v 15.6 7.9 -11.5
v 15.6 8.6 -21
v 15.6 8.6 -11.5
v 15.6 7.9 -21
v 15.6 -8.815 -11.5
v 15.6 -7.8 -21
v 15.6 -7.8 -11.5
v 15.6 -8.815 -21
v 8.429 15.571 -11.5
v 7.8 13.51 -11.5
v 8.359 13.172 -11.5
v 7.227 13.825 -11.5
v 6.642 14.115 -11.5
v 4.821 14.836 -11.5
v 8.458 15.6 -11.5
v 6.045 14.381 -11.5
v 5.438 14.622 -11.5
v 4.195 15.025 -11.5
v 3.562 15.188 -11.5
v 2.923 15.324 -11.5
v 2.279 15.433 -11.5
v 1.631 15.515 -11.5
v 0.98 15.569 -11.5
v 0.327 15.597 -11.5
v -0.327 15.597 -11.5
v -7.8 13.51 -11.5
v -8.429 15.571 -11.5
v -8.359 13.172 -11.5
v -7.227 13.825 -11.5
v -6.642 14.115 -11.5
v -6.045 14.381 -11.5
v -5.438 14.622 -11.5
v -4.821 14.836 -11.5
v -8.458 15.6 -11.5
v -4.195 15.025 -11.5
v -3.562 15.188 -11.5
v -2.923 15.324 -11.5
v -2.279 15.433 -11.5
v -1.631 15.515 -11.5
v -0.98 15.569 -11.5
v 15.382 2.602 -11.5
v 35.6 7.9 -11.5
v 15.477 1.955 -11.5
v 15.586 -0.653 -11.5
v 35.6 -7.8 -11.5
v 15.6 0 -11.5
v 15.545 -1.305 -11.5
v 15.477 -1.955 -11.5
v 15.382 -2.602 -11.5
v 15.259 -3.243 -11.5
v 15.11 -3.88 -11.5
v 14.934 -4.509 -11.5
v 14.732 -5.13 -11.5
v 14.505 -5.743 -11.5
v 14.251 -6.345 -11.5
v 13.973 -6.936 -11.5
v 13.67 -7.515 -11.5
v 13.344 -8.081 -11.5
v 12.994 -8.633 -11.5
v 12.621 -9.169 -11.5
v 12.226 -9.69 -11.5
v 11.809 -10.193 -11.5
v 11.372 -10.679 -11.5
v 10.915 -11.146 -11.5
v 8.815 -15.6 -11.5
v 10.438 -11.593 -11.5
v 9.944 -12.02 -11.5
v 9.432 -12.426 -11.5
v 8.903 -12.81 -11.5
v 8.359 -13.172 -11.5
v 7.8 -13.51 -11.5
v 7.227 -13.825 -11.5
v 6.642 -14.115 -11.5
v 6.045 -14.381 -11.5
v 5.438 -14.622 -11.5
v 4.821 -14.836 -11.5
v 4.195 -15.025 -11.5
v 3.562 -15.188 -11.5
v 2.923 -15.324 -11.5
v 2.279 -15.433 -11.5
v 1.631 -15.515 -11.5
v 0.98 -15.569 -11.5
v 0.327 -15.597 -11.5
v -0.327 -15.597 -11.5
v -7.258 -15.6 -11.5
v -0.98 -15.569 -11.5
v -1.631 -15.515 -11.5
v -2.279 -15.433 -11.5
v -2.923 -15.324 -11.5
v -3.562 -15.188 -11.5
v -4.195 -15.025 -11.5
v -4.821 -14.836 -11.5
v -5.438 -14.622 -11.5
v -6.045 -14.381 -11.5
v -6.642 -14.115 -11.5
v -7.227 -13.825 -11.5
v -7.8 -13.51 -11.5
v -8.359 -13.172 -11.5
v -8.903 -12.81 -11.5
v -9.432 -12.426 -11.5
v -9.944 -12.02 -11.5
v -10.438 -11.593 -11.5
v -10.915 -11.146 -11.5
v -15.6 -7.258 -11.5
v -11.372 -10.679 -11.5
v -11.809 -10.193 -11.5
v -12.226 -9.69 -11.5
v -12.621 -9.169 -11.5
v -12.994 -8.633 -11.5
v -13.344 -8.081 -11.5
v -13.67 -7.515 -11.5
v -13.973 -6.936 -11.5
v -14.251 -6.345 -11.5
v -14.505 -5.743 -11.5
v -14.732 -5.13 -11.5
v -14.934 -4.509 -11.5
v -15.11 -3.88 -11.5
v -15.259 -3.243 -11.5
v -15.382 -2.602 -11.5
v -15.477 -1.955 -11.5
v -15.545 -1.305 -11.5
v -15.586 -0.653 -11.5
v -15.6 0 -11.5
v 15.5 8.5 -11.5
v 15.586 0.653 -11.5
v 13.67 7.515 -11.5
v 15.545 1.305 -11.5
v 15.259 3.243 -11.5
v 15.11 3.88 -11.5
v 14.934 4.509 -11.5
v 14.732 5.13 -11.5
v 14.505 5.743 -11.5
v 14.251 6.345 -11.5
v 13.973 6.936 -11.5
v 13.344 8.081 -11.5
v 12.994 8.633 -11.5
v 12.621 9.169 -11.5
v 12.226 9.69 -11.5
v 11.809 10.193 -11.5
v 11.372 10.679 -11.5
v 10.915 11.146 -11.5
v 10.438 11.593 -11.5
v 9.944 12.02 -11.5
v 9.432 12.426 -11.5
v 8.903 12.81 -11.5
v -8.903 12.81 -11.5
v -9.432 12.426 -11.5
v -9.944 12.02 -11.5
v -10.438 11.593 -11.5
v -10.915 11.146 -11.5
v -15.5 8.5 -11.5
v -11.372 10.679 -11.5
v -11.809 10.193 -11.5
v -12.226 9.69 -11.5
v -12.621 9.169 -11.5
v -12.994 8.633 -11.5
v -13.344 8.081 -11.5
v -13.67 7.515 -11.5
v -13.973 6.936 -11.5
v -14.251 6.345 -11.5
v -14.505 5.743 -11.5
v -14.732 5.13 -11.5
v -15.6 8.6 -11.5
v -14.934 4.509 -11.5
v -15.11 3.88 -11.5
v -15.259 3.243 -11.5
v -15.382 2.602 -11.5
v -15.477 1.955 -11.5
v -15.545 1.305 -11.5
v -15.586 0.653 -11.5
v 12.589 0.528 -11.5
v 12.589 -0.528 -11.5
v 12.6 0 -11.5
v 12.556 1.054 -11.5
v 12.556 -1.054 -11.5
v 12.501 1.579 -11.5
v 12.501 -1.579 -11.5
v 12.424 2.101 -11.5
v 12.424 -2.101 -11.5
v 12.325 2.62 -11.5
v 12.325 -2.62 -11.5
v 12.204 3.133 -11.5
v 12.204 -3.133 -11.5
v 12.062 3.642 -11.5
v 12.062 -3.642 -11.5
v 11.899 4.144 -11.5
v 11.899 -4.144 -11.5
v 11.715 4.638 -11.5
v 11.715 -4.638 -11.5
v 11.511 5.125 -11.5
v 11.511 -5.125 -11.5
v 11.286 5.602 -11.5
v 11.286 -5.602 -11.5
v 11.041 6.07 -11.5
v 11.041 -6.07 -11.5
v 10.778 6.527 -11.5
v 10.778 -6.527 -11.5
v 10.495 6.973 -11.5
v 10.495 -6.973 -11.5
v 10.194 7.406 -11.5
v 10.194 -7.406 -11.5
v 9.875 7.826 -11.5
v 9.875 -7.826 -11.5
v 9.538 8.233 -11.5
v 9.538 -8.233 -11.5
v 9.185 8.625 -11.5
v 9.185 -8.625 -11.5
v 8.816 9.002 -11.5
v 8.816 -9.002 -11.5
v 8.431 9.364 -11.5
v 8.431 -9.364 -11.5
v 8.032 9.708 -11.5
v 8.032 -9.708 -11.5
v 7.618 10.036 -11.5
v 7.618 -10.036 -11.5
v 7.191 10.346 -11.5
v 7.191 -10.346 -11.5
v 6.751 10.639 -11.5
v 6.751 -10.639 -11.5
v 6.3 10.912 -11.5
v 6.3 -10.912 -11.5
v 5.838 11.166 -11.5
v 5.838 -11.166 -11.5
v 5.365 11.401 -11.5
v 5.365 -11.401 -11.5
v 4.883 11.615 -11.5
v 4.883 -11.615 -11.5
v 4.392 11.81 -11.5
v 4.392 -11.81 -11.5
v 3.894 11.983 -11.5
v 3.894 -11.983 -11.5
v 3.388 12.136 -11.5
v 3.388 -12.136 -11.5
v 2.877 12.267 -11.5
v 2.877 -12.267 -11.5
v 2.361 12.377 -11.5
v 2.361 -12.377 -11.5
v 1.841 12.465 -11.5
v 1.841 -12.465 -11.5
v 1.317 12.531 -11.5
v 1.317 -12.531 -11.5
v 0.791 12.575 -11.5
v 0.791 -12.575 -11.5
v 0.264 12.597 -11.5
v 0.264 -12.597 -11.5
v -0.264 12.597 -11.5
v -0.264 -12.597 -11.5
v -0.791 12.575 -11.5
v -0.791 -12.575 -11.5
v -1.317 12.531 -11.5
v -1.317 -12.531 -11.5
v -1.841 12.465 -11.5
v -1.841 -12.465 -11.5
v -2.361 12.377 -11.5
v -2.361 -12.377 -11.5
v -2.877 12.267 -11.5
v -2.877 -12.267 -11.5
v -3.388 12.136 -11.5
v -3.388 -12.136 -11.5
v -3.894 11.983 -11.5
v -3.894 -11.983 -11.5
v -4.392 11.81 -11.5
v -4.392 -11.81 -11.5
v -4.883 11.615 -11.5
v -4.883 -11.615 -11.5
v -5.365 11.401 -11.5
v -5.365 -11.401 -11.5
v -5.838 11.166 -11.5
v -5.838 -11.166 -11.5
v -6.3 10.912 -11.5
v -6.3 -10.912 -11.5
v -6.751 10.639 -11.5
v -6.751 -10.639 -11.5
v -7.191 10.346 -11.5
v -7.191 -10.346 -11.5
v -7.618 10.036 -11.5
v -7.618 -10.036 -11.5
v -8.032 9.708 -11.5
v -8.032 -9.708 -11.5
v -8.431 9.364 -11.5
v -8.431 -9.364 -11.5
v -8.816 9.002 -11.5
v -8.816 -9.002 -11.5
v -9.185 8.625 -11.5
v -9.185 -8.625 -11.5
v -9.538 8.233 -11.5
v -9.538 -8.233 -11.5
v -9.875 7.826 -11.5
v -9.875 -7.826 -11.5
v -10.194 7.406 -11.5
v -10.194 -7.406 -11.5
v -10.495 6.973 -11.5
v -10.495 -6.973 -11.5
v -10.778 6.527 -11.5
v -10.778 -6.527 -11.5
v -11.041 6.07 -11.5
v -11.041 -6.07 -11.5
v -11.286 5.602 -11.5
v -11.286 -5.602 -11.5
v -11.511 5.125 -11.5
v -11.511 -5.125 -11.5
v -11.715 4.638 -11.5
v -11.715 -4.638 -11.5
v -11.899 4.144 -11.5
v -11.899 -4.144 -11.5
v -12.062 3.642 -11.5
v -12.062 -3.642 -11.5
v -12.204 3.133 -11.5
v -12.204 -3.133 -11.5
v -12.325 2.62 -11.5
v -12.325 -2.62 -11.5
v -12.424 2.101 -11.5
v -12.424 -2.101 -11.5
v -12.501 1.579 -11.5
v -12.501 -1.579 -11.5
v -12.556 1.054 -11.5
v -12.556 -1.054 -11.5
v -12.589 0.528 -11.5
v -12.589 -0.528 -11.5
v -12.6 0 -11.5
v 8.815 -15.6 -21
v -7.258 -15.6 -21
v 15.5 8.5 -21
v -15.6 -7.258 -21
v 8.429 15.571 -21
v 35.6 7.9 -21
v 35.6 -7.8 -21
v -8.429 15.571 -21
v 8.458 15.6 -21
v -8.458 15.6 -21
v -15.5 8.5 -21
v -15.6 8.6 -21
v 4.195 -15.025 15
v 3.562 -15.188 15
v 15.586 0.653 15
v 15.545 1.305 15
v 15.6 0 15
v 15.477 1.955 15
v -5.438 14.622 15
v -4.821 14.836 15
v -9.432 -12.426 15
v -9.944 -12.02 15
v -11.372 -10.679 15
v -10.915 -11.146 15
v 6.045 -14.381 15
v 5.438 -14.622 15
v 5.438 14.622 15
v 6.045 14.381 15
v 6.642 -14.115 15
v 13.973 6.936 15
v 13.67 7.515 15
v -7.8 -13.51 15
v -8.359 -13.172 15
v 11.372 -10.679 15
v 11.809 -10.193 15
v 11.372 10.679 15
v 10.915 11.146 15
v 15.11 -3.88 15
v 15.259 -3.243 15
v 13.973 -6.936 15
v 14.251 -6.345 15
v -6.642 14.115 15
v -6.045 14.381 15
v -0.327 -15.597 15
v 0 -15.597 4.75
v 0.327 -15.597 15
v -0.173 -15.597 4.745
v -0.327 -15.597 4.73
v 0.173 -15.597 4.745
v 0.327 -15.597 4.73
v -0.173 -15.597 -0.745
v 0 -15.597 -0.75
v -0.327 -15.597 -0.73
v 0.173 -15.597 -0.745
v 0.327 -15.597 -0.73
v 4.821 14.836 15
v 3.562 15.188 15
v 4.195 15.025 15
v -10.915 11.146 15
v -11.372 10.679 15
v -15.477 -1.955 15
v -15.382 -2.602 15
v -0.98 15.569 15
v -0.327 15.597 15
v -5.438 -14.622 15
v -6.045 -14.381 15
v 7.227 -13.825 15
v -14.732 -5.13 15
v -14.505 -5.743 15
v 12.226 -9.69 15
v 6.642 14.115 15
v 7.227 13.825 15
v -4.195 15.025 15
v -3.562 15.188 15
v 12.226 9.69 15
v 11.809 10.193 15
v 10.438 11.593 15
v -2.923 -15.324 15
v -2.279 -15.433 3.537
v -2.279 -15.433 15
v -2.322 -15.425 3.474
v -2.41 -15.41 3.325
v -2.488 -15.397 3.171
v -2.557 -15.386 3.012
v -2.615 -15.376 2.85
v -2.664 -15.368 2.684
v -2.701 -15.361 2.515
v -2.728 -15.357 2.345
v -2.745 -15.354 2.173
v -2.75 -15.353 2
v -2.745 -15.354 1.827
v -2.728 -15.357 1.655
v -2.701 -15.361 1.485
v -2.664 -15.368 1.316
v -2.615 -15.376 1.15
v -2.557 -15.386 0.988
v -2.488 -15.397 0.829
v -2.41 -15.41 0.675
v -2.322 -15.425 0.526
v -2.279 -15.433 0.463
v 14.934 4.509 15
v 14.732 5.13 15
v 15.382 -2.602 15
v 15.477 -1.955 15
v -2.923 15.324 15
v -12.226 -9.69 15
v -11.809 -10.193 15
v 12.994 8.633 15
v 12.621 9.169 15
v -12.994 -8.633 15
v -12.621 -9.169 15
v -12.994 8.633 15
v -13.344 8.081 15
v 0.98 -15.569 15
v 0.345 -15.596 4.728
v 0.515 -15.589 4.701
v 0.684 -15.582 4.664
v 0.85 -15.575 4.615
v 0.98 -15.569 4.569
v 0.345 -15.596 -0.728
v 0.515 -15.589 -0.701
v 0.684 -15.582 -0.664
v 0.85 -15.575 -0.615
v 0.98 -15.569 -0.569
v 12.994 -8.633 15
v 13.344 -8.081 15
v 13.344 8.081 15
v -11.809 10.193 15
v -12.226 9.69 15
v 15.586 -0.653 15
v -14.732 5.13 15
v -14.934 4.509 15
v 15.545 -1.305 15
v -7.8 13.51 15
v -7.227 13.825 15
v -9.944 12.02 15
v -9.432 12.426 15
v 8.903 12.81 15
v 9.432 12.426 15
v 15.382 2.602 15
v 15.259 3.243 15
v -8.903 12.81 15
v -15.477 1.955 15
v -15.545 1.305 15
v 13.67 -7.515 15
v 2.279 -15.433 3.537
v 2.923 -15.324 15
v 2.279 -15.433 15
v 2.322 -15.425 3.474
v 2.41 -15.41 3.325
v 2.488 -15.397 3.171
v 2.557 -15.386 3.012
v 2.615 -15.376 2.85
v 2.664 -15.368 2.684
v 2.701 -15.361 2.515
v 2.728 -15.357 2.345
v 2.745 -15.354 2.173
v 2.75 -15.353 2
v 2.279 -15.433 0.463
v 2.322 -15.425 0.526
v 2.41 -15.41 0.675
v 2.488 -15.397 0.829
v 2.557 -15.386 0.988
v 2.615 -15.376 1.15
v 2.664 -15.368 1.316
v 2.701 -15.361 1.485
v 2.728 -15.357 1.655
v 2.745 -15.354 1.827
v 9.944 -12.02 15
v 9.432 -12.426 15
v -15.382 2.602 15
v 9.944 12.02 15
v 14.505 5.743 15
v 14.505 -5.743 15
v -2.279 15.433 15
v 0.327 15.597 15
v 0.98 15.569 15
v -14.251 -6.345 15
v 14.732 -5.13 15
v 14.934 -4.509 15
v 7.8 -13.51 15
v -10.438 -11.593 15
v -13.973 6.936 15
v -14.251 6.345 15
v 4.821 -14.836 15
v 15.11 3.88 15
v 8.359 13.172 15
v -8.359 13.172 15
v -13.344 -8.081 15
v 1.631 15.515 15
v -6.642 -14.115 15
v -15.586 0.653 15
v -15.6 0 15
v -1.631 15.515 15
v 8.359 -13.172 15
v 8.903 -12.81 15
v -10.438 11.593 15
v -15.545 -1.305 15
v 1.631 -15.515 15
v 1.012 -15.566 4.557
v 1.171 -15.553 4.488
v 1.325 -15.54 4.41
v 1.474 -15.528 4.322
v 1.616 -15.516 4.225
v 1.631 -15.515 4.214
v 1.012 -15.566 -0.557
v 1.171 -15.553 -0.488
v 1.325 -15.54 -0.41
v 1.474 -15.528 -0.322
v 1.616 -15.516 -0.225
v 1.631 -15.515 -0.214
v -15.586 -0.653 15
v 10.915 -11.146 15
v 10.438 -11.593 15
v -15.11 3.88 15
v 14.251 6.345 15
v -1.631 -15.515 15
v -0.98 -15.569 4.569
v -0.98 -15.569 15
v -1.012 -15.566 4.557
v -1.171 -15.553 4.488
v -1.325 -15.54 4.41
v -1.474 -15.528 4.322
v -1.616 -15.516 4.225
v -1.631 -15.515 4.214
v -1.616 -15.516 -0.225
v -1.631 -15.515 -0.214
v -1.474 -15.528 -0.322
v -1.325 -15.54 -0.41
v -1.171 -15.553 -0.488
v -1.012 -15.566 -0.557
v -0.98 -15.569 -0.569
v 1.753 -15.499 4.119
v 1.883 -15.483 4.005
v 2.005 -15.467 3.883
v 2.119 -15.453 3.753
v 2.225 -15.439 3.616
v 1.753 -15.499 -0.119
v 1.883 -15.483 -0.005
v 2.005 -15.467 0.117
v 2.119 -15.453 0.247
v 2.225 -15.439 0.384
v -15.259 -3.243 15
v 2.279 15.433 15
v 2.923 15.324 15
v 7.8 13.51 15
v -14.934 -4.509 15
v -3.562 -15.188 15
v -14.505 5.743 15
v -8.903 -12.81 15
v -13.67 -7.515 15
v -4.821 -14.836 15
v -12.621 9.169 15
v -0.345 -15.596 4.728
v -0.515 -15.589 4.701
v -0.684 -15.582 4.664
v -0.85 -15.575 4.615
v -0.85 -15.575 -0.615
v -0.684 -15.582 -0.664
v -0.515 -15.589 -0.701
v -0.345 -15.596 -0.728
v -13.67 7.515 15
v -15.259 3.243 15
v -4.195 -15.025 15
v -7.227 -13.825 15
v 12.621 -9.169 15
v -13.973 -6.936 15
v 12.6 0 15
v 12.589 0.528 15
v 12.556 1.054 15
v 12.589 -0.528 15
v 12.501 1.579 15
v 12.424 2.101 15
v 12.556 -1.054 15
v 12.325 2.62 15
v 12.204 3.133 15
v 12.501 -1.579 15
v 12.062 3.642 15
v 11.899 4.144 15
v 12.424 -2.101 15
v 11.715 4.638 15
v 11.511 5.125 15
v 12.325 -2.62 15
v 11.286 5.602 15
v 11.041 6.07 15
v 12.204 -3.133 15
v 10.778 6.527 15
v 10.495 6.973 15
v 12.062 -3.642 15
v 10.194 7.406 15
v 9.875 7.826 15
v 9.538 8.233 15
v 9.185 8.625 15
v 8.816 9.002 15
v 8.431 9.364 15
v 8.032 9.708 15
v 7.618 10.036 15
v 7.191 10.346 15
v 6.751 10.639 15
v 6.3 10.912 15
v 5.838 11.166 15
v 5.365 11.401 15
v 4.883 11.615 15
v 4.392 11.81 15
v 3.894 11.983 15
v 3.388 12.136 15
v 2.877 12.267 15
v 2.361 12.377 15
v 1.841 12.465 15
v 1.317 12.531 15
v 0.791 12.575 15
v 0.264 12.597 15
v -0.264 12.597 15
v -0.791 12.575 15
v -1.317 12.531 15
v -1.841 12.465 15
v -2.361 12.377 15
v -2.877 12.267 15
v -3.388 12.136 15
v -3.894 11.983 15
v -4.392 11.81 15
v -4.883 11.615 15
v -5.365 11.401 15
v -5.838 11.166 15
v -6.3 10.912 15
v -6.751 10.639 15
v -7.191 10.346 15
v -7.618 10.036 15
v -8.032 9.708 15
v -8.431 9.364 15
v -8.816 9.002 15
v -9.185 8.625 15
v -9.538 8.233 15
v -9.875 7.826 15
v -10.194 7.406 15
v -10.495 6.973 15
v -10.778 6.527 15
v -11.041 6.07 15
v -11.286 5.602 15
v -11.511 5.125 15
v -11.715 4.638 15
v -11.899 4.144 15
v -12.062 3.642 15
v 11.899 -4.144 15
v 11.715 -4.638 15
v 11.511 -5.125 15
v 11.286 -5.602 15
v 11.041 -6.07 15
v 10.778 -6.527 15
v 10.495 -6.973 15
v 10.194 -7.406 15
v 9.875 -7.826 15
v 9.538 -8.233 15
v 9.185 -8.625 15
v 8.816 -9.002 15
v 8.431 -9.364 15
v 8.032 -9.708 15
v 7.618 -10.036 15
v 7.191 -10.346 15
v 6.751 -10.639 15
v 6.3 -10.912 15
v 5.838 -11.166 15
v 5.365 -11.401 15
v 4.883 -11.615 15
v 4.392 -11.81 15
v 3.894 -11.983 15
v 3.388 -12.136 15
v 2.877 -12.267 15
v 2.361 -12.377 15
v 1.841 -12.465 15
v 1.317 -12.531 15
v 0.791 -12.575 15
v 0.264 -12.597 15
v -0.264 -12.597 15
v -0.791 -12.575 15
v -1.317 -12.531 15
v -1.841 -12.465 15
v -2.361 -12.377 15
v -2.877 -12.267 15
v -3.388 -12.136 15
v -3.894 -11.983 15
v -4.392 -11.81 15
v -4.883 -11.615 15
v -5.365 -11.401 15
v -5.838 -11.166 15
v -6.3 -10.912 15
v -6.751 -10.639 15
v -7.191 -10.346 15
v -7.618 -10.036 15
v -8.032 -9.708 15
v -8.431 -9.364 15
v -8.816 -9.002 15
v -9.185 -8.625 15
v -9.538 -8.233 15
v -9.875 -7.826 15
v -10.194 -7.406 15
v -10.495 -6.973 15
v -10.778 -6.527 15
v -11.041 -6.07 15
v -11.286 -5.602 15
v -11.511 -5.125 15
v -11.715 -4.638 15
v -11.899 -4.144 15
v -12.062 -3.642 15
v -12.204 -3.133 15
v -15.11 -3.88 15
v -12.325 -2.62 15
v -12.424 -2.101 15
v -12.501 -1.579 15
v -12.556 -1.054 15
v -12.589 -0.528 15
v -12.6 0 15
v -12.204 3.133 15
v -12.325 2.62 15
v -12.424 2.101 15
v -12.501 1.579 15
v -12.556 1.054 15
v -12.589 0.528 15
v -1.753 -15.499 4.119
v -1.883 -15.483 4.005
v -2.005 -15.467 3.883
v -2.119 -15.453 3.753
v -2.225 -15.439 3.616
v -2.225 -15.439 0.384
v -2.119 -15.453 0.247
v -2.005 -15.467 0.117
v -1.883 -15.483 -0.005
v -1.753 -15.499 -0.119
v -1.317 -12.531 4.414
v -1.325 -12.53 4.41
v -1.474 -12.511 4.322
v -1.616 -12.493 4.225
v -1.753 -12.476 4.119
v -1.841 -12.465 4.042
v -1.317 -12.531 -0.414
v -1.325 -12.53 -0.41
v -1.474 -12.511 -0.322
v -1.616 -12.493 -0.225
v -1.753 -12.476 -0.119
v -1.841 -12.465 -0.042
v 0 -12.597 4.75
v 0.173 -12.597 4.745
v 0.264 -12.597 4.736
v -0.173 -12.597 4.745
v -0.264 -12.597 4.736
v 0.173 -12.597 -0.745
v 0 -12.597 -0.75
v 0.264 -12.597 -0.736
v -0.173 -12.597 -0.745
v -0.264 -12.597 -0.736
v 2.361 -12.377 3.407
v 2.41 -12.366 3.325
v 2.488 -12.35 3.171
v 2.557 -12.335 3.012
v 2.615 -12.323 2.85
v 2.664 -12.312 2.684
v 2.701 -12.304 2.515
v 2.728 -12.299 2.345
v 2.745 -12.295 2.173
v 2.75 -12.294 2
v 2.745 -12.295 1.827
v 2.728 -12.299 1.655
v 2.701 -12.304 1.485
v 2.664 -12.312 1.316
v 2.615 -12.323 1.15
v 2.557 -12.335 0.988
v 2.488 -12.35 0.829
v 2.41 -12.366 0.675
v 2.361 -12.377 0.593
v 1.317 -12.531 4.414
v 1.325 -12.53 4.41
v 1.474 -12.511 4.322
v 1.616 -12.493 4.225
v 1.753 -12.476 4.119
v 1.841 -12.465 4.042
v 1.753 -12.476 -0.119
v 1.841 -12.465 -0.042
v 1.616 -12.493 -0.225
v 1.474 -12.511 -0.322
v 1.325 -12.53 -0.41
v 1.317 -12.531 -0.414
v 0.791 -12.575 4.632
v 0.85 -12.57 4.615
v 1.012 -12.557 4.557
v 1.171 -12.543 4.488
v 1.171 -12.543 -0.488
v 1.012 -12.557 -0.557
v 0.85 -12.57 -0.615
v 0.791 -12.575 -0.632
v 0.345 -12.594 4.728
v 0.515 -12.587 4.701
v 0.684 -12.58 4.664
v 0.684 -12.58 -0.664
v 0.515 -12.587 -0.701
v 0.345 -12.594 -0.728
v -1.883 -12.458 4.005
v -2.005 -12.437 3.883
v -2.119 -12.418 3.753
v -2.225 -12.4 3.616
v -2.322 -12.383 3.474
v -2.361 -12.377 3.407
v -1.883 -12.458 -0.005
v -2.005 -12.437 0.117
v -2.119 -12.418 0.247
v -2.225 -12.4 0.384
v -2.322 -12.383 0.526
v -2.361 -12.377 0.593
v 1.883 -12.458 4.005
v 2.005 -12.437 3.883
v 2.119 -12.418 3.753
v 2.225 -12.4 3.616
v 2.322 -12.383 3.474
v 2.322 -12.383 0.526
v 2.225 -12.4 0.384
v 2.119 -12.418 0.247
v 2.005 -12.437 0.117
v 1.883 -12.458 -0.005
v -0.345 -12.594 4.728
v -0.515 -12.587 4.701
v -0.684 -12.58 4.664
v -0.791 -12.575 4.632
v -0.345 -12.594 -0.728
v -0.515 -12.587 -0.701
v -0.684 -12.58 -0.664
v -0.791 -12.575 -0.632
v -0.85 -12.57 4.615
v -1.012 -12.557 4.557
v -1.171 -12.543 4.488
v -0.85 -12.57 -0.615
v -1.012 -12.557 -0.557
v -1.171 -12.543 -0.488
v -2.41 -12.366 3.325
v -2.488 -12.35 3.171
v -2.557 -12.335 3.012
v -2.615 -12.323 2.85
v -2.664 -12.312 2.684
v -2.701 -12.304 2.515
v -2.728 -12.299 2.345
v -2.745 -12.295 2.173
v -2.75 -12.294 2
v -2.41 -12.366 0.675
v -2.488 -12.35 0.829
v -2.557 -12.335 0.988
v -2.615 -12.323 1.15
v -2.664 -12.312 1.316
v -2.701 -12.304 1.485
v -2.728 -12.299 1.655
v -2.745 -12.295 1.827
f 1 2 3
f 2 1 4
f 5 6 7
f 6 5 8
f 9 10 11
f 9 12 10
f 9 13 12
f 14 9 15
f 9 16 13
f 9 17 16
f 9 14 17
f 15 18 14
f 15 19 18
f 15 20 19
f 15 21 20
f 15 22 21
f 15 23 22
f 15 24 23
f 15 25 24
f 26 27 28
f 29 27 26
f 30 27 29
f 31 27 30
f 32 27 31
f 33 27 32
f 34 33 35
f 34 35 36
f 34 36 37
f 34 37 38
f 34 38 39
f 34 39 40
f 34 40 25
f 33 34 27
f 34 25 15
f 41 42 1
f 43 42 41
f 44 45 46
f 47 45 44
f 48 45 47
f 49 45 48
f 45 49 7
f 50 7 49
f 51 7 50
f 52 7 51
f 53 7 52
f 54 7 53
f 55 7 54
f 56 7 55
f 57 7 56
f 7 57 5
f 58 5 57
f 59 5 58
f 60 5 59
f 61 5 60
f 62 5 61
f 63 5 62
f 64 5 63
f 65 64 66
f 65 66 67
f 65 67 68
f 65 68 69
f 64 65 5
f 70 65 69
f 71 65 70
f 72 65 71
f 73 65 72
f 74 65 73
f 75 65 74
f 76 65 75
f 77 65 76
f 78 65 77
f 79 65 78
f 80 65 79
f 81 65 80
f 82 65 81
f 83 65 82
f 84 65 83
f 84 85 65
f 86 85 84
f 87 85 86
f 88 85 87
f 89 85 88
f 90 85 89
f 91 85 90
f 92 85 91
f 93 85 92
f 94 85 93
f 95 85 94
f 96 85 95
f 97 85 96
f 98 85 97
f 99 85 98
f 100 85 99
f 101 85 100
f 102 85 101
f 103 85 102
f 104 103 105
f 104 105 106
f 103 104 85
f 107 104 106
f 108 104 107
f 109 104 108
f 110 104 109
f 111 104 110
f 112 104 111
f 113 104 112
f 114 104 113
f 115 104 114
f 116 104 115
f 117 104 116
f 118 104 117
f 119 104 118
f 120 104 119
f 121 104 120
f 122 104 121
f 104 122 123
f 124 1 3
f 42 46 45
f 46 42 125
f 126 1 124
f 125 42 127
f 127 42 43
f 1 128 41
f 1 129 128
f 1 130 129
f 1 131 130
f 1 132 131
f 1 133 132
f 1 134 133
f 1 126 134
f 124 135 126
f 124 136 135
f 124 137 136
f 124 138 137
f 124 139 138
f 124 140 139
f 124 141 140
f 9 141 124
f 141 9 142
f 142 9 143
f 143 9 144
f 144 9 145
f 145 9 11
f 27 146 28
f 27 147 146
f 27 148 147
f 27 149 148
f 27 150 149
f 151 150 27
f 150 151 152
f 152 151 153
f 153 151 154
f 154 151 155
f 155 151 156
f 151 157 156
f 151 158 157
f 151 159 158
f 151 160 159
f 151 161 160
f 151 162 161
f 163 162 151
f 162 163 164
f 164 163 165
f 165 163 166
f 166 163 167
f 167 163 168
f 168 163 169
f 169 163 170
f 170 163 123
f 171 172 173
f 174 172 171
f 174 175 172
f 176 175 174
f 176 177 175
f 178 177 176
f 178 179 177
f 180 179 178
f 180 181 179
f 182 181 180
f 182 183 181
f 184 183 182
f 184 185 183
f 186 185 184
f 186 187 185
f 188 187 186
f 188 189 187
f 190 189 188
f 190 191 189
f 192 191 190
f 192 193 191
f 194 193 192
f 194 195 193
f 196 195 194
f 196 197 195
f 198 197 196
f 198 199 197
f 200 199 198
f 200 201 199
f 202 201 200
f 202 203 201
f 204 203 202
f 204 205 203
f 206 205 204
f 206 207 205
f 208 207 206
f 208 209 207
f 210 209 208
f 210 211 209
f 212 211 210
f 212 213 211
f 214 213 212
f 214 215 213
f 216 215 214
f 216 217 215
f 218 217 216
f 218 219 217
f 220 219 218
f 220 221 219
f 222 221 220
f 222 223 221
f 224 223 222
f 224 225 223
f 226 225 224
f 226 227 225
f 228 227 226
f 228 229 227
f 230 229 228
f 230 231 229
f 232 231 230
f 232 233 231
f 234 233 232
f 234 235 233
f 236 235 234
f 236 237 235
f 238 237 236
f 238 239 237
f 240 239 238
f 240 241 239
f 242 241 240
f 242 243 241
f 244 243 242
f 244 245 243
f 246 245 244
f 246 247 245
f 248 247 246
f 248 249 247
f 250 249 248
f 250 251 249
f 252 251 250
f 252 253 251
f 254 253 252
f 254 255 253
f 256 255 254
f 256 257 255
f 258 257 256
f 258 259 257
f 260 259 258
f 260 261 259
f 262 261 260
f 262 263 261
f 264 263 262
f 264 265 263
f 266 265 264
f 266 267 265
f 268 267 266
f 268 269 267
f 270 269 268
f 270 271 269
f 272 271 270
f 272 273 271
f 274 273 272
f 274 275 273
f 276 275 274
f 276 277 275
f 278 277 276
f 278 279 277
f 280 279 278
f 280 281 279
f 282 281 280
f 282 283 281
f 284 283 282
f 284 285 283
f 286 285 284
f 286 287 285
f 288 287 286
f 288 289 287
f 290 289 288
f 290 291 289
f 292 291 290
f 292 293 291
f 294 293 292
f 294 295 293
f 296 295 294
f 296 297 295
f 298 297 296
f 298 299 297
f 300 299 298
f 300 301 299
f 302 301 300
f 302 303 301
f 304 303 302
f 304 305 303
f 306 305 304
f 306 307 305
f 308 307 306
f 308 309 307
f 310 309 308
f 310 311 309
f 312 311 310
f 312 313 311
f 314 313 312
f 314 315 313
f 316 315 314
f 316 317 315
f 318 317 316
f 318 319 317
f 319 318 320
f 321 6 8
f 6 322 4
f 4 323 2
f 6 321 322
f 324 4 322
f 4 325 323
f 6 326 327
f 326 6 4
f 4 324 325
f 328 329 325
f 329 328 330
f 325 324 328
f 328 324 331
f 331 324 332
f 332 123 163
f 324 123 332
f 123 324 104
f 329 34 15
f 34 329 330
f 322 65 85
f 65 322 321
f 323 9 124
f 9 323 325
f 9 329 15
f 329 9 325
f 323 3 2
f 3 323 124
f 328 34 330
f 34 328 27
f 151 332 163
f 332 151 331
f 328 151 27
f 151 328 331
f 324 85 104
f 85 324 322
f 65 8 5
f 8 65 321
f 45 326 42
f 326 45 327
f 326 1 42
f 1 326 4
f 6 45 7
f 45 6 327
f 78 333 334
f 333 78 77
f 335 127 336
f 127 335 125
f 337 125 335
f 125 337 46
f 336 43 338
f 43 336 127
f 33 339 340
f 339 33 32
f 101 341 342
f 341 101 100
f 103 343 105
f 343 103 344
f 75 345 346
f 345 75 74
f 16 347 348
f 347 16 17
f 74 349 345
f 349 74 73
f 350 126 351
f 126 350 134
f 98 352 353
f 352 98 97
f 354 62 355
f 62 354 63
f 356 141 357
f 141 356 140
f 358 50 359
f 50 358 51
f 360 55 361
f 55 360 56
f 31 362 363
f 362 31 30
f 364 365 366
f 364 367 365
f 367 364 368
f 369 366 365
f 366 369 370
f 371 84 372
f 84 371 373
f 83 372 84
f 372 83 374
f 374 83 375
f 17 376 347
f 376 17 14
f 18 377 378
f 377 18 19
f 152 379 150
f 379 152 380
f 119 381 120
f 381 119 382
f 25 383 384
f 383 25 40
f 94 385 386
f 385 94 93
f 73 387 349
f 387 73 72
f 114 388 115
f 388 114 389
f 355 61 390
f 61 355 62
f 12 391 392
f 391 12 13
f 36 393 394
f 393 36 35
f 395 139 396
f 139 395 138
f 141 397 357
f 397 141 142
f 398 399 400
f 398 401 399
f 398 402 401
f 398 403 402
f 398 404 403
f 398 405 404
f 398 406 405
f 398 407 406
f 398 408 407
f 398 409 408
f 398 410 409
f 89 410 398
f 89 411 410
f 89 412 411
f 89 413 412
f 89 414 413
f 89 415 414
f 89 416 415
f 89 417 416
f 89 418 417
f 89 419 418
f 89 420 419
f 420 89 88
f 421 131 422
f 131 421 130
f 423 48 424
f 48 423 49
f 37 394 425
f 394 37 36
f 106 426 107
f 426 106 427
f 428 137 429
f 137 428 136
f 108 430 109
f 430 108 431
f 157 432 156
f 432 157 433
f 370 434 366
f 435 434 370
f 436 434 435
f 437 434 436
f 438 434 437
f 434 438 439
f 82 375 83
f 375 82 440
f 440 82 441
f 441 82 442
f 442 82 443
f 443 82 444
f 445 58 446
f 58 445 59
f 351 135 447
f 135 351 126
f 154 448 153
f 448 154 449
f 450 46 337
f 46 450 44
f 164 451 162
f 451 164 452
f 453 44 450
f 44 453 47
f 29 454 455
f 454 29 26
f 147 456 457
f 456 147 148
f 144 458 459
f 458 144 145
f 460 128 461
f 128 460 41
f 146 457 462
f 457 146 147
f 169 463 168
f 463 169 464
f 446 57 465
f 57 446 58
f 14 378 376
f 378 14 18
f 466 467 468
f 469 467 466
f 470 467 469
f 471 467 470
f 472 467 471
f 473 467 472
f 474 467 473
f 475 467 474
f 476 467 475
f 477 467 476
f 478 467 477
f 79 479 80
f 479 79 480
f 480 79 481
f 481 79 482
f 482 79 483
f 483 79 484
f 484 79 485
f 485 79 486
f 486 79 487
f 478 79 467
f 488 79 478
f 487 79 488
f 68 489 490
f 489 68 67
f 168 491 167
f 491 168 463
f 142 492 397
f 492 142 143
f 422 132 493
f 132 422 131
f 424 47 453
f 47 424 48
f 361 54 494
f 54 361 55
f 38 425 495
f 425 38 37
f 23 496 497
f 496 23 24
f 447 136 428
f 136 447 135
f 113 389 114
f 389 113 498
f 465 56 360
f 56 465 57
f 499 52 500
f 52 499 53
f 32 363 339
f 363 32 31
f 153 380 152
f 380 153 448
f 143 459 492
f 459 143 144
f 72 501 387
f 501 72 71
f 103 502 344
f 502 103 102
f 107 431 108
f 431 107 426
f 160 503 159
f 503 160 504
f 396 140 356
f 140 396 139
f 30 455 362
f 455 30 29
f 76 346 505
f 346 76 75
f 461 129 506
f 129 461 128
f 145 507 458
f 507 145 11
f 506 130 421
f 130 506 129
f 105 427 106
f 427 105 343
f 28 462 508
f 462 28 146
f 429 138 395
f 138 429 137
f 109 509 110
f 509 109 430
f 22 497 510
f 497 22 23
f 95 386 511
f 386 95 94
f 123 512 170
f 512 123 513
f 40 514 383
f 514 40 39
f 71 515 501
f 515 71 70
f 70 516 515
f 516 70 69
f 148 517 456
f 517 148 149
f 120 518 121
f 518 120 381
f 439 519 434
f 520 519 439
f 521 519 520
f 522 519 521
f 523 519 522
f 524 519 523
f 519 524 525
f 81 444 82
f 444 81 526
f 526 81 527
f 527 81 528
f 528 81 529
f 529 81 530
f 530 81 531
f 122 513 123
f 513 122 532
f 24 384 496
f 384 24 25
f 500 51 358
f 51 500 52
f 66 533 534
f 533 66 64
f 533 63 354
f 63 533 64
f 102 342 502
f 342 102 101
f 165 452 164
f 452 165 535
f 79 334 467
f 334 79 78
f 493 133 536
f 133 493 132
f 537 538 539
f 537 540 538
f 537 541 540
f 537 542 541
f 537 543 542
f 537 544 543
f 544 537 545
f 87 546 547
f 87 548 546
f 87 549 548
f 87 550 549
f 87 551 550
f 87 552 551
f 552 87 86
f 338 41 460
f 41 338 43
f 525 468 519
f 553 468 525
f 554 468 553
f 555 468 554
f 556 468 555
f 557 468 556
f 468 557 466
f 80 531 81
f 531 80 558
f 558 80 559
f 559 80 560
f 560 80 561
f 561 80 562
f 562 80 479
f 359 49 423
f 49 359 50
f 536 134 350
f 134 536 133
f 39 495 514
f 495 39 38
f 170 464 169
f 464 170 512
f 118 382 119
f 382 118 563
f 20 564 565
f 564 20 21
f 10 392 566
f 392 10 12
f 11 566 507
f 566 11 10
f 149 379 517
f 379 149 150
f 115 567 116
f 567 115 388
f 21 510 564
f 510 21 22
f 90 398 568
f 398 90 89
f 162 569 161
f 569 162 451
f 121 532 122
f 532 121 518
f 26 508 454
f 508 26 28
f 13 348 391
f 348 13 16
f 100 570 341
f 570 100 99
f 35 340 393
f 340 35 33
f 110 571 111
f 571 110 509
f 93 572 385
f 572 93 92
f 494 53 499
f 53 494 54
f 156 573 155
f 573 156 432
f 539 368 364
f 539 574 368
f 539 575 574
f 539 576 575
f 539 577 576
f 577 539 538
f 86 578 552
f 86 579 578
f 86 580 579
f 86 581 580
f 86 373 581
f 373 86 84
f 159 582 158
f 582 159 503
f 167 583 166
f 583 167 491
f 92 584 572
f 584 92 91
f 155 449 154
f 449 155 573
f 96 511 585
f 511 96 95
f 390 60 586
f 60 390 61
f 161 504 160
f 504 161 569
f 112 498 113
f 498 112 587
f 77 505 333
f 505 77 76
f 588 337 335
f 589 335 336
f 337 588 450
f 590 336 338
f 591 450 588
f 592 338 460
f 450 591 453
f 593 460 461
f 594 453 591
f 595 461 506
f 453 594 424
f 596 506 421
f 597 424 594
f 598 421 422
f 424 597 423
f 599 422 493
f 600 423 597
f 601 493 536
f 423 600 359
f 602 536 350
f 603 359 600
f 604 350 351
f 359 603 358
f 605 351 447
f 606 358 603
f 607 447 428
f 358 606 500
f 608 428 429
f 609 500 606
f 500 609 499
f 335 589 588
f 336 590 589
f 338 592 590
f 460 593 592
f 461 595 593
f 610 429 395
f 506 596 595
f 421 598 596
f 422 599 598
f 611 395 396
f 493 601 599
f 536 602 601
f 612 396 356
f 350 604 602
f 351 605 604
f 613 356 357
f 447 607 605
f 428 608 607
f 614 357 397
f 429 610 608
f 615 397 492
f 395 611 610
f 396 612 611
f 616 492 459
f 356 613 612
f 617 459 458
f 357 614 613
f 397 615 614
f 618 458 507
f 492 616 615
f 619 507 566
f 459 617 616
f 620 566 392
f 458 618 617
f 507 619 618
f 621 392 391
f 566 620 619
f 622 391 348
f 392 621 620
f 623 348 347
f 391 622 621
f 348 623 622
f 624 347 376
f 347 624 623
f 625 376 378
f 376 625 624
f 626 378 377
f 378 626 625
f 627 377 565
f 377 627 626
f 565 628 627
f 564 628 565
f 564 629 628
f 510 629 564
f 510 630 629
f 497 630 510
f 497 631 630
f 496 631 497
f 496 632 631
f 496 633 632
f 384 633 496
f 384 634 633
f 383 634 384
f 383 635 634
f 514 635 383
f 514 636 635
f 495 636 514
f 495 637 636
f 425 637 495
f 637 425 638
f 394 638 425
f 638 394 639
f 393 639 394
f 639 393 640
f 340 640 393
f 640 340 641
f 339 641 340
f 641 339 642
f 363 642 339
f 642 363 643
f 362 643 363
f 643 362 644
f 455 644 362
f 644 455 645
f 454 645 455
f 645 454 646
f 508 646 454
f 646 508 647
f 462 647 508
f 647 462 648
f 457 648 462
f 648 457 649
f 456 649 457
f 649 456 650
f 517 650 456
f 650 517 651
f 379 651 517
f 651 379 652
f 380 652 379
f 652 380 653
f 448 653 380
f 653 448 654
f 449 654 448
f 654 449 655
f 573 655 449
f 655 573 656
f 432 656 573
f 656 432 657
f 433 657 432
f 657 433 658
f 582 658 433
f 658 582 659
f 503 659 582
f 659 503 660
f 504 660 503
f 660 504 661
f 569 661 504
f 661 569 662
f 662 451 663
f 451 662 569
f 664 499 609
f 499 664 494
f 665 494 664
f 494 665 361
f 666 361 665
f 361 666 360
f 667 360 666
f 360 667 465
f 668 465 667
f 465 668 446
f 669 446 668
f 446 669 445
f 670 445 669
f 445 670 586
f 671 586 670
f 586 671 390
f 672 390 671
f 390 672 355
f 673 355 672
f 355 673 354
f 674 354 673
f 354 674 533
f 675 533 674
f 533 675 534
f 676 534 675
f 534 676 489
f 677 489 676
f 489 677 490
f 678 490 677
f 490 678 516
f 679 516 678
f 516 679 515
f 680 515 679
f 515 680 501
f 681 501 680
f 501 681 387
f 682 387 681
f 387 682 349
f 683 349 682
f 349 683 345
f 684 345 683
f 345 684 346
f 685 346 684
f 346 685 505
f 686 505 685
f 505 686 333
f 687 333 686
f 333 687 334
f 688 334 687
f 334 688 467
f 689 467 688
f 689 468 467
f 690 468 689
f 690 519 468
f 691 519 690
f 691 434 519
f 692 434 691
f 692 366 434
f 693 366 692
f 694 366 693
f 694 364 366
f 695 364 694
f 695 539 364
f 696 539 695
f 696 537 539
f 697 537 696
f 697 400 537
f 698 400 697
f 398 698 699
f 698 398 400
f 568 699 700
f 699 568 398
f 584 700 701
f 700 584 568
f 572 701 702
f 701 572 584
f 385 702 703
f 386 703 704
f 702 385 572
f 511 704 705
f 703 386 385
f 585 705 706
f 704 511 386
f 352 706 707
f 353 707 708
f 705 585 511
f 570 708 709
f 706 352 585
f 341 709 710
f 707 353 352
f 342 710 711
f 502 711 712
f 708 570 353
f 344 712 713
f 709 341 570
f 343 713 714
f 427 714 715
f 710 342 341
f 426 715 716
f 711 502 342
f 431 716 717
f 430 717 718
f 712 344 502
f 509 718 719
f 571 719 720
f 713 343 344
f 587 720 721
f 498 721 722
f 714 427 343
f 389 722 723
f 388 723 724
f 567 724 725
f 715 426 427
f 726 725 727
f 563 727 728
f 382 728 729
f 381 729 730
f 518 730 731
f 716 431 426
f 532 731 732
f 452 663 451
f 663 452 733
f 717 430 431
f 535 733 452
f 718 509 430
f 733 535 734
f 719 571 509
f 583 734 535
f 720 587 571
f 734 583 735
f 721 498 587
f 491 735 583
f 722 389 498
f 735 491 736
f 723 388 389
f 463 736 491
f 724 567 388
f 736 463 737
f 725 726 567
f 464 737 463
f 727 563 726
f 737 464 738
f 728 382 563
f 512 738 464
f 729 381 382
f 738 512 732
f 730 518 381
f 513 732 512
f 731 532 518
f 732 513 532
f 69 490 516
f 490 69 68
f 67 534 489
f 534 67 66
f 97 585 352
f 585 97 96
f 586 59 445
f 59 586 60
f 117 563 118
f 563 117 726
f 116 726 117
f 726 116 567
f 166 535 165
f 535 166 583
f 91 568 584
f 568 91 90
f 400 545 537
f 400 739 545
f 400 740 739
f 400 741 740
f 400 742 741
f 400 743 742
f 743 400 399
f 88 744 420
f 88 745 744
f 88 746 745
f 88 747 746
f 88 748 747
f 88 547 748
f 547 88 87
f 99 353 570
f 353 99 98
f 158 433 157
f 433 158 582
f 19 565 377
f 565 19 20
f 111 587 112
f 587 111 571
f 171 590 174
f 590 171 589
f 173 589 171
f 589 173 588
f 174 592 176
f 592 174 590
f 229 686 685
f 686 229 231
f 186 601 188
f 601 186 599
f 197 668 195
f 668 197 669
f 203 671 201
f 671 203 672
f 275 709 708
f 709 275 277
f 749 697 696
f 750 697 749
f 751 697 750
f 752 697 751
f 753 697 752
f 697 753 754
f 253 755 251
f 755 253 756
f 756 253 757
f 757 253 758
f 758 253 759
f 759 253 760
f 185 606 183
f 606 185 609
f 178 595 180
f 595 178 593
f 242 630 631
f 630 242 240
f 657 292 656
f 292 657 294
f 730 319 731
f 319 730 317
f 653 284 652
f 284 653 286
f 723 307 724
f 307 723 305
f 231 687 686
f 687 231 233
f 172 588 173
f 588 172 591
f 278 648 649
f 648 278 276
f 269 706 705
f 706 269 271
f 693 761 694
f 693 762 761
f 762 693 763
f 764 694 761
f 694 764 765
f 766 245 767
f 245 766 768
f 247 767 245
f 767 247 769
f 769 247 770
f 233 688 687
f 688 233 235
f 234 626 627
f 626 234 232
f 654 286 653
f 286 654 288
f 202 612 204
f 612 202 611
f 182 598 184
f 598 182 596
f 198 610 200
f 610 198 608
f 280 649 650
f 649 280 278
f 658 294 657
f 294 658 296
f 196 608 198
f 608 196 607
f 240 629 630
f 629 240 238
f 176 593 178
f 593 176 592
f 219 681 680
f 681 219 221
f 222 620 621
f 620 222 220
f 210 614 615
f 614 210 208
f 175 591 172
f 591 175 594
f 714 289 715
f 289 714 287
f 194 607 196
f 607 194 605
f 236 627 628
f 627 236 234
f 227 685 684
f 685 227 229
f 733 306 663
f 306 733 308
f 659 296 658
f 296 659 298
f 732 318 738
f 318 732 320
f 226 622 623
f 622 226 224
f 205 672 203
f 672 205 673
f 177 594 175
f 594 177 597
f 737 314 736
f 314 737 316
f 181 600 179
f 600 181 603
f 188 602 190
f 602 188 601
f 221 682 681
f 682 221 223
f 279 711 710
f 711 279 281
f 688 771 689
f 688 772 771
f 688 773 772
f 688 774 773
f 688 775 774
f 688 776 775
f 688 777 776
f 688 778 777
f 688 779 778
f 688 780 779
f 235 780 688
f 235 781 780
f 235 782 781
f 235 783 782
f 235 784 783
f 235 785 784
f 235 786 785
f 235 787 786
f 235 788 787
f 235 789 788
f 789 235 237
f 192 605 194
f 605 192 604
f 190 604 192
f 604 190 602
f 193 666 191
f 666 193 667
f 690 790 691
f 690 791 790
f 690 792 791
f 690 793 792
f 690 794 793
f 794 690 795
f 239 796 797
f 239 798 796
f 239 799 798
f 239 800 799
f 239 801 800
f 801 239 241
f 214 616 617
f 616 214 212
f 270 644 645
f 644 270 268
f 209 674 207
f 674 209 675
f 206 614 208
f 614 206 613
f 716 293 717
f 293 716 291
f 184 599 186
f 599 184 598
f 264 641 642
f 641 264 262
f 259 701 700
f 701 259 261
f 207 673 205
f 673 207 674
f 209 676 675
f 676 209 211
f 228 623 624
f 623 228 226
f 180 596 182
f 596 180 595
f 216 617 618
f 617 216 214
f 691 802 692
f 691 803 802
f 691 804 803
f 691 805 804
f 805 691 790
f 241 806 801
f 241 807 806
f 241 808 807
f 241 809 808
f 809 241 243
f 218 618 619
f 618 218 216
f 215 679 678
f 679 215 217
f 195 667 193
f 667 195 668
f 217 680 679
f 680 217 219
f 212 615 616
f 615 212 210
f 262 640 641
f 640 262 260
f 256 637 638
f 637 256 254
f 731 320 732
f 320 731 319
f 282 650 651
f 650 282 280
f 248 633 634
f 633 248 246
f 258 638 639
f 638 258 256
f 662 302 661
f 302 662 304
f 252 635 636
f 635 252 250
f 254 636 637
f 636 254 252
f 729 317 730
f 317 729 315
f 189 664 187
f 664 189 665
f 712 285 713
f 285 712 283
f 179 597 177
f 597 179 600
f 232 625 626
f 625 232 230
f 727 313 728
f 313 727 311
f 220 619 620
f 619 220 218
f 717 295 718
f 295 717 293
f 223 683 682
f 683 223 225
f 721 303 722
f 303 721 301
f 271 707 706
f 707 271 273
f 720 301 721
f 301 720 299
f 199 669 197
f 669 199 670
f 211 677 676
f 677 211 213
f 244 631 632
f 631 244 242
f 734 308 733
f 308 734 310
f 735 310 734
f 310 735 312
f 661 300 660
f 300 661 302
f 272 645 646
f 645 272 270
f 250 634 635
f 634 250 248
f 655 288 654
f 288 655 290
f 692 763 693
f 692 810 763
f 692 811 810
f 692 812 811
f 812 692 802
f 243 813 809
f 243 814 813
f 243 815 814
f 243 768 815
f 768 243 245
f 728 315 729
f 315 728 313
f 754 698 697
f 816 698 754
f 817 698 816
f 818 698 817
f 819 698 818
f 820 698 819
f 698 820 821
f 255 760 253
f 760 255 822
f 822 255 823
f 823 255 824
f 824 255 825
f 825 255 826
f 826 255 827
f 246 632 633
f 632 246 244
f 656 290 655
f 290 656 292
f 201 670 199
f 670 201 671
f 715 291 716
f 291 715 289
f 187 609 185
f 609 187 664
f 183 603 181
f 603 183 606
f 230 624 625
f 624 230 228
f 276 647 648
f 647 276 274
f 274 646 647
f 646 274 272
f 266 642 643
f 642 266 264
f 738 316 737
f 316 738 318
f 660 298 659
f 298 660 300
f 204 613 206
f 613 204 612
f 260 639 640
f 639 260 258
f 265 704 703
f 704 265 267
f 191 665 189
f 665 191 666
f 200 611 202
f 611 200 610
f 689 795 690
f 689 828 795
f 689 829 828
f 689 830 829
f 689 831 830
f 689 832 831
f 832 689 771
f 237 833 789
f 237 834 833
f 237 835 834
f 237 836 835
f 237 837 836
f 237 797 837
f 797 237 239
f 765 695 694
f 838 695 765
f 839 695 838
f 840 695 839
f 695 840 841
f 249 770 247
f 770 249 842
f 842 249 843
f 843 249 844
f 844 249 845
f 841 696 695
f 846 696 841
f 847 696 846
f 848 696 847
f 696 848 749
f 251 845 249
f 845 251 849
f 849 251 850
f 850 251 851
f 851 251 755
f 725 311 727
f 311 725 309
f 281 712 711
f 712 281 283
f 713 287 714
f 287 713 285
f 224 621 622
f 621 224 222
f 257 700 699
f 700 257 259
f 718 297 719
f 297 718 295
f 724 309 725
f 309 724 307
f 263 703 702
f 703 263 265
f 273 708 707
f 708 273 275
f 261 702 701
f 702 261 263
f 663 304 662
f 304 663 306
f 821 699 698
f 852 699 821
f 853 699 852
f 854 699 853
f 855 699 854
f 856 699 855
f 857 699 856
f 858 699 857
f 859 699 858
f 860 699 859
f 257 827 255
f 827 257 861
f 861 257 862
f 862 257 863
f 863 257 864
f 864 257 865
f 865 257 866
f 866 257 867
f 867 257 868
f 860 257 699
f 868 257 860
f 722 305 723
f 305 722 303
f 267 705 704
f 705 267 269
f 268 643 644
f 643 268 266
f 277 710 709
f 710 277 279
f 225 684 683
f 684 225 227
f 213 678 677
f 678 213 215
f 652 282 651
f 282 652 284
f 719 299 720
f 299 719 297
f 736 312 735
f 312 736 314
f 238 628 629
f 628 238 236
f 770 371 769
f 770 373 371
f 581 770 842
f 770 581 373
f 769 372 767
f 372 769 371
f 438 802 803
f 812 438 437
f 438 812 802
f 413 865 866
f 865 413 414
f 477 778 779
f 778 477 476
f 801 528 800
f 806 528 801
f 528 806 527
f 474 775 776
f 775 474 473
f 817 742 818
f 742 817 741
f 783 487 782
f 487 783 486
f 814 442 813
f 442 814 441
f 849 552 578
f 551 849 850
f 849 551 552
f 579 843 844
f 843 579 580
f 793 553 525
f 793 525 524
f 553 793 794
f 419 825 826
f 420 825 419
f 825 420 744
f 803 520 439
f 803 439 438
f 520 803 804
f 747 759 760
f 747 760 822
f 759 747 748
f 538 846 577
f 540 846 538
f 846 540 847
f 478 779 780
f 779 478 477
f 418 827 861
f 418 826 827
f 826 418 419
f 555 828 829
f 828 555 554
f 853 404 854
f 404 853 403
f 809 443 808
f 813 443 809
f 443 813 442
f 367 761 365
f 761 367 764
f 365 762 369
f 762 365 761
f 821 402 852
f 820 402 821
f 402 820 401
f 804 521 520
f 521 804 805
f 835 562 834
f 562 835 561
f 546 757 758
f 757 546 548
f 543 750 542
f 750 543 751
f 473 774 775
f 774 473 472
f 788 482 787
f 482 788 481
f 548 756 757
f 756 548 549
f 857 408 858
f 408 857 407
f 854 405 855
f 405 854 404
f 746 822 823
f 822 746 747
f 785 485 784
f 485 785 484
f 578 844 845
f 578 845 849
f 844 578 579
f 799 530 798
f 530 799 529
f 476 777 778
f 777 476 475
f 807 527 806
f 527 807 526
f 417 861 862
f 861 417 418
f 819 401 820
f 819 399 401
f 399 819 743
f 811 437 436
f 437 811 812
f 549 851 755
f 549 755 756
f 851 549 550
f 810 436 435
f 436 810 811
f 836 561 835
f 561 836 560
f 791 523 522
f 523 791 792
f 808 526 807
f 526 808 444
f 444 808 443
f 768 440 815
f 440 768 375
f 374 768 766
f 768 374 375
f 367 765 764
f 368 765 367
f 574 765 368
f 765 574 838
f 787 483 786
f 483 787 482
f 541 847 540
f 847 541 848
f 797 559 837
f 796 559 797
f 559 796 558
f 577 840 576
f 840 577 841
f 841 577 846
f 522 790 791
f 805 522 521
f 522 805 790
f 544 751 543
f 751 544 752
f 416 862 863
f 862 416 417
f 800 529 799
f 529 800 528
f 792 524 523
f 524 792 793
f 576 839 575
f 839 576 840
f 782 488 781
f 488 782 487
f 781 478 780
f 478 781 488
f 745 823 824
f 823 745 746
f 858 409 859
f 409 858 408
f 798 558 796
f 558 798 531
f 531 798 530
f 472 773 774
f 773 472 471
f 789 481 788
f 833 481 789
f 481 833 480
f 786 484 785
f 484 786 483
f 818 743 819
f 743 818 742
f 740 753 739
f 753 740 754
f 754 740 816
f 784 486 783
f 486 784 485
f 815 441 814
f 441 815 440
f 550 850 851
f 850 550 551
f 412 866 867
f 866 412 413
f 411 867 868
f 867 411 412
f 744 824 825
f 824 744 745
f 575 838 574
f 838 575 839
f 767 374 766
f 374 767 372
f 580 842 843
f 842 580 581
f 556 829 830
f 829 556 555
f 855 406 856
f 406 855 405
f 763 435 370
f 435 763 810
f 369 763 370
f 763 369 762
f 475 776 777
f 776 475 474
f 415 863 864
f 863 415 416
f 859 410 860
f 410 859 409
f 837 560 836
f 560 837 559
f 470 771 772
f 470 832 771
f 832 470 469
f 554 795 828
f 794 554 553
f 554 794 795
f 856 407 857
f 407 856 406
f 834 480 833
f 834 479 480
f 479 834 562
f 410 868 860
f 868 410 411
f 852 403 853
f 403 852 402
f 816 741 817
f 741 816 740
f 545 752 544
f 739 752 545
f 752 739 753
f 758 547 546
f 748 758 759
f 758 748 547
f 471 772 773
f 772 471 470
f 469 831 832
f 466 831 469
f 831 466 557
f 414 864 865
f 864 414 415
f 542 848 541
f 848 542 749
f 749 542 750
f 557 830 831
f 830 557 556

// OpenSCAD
baseAndRackNotch();
railCap();

module railCap() {
	color("LightBlue") difference() {
		cylinder( h = 30, r = (31.2 / 2), center = true, $fn = 150 );
		cylinder( h = 31, r = (25.2 / 2), center = true, $fn = 150 );
		translate([0,-(32.75/2),2]) rotate([00,90,90]) color("LightGreen") cylinder ( h = 8, r = 2.75, $fn = 100 );
	}
}

module baseAndRackNotch() {
	difference() {
		translate([-31.2/2, -31.2/2, -21]) cube([31.2, 31.2, 9.5]);
		color("gray") translate([15.5, 8.5, -21]) rotate([0, 0, 45]) cube([10,10,10]);
		color("gray") translate([-15.5, 8.5, -21]) rotate([0, 0, 45]) cube([10,10,10]);
		color("gray") translate([-14, -23, -21]) rotate([0, 0, 45]) cube([10,13,10]);
		color("gray") translate([17.8, -25, -21]) rotate([0, 0, 45]) cube([10,13,10]);
	}

	color("magenta") translate([31.2/2, -(31.2/4), -21]) cube([20, 15.70, 9.5]);	
}
